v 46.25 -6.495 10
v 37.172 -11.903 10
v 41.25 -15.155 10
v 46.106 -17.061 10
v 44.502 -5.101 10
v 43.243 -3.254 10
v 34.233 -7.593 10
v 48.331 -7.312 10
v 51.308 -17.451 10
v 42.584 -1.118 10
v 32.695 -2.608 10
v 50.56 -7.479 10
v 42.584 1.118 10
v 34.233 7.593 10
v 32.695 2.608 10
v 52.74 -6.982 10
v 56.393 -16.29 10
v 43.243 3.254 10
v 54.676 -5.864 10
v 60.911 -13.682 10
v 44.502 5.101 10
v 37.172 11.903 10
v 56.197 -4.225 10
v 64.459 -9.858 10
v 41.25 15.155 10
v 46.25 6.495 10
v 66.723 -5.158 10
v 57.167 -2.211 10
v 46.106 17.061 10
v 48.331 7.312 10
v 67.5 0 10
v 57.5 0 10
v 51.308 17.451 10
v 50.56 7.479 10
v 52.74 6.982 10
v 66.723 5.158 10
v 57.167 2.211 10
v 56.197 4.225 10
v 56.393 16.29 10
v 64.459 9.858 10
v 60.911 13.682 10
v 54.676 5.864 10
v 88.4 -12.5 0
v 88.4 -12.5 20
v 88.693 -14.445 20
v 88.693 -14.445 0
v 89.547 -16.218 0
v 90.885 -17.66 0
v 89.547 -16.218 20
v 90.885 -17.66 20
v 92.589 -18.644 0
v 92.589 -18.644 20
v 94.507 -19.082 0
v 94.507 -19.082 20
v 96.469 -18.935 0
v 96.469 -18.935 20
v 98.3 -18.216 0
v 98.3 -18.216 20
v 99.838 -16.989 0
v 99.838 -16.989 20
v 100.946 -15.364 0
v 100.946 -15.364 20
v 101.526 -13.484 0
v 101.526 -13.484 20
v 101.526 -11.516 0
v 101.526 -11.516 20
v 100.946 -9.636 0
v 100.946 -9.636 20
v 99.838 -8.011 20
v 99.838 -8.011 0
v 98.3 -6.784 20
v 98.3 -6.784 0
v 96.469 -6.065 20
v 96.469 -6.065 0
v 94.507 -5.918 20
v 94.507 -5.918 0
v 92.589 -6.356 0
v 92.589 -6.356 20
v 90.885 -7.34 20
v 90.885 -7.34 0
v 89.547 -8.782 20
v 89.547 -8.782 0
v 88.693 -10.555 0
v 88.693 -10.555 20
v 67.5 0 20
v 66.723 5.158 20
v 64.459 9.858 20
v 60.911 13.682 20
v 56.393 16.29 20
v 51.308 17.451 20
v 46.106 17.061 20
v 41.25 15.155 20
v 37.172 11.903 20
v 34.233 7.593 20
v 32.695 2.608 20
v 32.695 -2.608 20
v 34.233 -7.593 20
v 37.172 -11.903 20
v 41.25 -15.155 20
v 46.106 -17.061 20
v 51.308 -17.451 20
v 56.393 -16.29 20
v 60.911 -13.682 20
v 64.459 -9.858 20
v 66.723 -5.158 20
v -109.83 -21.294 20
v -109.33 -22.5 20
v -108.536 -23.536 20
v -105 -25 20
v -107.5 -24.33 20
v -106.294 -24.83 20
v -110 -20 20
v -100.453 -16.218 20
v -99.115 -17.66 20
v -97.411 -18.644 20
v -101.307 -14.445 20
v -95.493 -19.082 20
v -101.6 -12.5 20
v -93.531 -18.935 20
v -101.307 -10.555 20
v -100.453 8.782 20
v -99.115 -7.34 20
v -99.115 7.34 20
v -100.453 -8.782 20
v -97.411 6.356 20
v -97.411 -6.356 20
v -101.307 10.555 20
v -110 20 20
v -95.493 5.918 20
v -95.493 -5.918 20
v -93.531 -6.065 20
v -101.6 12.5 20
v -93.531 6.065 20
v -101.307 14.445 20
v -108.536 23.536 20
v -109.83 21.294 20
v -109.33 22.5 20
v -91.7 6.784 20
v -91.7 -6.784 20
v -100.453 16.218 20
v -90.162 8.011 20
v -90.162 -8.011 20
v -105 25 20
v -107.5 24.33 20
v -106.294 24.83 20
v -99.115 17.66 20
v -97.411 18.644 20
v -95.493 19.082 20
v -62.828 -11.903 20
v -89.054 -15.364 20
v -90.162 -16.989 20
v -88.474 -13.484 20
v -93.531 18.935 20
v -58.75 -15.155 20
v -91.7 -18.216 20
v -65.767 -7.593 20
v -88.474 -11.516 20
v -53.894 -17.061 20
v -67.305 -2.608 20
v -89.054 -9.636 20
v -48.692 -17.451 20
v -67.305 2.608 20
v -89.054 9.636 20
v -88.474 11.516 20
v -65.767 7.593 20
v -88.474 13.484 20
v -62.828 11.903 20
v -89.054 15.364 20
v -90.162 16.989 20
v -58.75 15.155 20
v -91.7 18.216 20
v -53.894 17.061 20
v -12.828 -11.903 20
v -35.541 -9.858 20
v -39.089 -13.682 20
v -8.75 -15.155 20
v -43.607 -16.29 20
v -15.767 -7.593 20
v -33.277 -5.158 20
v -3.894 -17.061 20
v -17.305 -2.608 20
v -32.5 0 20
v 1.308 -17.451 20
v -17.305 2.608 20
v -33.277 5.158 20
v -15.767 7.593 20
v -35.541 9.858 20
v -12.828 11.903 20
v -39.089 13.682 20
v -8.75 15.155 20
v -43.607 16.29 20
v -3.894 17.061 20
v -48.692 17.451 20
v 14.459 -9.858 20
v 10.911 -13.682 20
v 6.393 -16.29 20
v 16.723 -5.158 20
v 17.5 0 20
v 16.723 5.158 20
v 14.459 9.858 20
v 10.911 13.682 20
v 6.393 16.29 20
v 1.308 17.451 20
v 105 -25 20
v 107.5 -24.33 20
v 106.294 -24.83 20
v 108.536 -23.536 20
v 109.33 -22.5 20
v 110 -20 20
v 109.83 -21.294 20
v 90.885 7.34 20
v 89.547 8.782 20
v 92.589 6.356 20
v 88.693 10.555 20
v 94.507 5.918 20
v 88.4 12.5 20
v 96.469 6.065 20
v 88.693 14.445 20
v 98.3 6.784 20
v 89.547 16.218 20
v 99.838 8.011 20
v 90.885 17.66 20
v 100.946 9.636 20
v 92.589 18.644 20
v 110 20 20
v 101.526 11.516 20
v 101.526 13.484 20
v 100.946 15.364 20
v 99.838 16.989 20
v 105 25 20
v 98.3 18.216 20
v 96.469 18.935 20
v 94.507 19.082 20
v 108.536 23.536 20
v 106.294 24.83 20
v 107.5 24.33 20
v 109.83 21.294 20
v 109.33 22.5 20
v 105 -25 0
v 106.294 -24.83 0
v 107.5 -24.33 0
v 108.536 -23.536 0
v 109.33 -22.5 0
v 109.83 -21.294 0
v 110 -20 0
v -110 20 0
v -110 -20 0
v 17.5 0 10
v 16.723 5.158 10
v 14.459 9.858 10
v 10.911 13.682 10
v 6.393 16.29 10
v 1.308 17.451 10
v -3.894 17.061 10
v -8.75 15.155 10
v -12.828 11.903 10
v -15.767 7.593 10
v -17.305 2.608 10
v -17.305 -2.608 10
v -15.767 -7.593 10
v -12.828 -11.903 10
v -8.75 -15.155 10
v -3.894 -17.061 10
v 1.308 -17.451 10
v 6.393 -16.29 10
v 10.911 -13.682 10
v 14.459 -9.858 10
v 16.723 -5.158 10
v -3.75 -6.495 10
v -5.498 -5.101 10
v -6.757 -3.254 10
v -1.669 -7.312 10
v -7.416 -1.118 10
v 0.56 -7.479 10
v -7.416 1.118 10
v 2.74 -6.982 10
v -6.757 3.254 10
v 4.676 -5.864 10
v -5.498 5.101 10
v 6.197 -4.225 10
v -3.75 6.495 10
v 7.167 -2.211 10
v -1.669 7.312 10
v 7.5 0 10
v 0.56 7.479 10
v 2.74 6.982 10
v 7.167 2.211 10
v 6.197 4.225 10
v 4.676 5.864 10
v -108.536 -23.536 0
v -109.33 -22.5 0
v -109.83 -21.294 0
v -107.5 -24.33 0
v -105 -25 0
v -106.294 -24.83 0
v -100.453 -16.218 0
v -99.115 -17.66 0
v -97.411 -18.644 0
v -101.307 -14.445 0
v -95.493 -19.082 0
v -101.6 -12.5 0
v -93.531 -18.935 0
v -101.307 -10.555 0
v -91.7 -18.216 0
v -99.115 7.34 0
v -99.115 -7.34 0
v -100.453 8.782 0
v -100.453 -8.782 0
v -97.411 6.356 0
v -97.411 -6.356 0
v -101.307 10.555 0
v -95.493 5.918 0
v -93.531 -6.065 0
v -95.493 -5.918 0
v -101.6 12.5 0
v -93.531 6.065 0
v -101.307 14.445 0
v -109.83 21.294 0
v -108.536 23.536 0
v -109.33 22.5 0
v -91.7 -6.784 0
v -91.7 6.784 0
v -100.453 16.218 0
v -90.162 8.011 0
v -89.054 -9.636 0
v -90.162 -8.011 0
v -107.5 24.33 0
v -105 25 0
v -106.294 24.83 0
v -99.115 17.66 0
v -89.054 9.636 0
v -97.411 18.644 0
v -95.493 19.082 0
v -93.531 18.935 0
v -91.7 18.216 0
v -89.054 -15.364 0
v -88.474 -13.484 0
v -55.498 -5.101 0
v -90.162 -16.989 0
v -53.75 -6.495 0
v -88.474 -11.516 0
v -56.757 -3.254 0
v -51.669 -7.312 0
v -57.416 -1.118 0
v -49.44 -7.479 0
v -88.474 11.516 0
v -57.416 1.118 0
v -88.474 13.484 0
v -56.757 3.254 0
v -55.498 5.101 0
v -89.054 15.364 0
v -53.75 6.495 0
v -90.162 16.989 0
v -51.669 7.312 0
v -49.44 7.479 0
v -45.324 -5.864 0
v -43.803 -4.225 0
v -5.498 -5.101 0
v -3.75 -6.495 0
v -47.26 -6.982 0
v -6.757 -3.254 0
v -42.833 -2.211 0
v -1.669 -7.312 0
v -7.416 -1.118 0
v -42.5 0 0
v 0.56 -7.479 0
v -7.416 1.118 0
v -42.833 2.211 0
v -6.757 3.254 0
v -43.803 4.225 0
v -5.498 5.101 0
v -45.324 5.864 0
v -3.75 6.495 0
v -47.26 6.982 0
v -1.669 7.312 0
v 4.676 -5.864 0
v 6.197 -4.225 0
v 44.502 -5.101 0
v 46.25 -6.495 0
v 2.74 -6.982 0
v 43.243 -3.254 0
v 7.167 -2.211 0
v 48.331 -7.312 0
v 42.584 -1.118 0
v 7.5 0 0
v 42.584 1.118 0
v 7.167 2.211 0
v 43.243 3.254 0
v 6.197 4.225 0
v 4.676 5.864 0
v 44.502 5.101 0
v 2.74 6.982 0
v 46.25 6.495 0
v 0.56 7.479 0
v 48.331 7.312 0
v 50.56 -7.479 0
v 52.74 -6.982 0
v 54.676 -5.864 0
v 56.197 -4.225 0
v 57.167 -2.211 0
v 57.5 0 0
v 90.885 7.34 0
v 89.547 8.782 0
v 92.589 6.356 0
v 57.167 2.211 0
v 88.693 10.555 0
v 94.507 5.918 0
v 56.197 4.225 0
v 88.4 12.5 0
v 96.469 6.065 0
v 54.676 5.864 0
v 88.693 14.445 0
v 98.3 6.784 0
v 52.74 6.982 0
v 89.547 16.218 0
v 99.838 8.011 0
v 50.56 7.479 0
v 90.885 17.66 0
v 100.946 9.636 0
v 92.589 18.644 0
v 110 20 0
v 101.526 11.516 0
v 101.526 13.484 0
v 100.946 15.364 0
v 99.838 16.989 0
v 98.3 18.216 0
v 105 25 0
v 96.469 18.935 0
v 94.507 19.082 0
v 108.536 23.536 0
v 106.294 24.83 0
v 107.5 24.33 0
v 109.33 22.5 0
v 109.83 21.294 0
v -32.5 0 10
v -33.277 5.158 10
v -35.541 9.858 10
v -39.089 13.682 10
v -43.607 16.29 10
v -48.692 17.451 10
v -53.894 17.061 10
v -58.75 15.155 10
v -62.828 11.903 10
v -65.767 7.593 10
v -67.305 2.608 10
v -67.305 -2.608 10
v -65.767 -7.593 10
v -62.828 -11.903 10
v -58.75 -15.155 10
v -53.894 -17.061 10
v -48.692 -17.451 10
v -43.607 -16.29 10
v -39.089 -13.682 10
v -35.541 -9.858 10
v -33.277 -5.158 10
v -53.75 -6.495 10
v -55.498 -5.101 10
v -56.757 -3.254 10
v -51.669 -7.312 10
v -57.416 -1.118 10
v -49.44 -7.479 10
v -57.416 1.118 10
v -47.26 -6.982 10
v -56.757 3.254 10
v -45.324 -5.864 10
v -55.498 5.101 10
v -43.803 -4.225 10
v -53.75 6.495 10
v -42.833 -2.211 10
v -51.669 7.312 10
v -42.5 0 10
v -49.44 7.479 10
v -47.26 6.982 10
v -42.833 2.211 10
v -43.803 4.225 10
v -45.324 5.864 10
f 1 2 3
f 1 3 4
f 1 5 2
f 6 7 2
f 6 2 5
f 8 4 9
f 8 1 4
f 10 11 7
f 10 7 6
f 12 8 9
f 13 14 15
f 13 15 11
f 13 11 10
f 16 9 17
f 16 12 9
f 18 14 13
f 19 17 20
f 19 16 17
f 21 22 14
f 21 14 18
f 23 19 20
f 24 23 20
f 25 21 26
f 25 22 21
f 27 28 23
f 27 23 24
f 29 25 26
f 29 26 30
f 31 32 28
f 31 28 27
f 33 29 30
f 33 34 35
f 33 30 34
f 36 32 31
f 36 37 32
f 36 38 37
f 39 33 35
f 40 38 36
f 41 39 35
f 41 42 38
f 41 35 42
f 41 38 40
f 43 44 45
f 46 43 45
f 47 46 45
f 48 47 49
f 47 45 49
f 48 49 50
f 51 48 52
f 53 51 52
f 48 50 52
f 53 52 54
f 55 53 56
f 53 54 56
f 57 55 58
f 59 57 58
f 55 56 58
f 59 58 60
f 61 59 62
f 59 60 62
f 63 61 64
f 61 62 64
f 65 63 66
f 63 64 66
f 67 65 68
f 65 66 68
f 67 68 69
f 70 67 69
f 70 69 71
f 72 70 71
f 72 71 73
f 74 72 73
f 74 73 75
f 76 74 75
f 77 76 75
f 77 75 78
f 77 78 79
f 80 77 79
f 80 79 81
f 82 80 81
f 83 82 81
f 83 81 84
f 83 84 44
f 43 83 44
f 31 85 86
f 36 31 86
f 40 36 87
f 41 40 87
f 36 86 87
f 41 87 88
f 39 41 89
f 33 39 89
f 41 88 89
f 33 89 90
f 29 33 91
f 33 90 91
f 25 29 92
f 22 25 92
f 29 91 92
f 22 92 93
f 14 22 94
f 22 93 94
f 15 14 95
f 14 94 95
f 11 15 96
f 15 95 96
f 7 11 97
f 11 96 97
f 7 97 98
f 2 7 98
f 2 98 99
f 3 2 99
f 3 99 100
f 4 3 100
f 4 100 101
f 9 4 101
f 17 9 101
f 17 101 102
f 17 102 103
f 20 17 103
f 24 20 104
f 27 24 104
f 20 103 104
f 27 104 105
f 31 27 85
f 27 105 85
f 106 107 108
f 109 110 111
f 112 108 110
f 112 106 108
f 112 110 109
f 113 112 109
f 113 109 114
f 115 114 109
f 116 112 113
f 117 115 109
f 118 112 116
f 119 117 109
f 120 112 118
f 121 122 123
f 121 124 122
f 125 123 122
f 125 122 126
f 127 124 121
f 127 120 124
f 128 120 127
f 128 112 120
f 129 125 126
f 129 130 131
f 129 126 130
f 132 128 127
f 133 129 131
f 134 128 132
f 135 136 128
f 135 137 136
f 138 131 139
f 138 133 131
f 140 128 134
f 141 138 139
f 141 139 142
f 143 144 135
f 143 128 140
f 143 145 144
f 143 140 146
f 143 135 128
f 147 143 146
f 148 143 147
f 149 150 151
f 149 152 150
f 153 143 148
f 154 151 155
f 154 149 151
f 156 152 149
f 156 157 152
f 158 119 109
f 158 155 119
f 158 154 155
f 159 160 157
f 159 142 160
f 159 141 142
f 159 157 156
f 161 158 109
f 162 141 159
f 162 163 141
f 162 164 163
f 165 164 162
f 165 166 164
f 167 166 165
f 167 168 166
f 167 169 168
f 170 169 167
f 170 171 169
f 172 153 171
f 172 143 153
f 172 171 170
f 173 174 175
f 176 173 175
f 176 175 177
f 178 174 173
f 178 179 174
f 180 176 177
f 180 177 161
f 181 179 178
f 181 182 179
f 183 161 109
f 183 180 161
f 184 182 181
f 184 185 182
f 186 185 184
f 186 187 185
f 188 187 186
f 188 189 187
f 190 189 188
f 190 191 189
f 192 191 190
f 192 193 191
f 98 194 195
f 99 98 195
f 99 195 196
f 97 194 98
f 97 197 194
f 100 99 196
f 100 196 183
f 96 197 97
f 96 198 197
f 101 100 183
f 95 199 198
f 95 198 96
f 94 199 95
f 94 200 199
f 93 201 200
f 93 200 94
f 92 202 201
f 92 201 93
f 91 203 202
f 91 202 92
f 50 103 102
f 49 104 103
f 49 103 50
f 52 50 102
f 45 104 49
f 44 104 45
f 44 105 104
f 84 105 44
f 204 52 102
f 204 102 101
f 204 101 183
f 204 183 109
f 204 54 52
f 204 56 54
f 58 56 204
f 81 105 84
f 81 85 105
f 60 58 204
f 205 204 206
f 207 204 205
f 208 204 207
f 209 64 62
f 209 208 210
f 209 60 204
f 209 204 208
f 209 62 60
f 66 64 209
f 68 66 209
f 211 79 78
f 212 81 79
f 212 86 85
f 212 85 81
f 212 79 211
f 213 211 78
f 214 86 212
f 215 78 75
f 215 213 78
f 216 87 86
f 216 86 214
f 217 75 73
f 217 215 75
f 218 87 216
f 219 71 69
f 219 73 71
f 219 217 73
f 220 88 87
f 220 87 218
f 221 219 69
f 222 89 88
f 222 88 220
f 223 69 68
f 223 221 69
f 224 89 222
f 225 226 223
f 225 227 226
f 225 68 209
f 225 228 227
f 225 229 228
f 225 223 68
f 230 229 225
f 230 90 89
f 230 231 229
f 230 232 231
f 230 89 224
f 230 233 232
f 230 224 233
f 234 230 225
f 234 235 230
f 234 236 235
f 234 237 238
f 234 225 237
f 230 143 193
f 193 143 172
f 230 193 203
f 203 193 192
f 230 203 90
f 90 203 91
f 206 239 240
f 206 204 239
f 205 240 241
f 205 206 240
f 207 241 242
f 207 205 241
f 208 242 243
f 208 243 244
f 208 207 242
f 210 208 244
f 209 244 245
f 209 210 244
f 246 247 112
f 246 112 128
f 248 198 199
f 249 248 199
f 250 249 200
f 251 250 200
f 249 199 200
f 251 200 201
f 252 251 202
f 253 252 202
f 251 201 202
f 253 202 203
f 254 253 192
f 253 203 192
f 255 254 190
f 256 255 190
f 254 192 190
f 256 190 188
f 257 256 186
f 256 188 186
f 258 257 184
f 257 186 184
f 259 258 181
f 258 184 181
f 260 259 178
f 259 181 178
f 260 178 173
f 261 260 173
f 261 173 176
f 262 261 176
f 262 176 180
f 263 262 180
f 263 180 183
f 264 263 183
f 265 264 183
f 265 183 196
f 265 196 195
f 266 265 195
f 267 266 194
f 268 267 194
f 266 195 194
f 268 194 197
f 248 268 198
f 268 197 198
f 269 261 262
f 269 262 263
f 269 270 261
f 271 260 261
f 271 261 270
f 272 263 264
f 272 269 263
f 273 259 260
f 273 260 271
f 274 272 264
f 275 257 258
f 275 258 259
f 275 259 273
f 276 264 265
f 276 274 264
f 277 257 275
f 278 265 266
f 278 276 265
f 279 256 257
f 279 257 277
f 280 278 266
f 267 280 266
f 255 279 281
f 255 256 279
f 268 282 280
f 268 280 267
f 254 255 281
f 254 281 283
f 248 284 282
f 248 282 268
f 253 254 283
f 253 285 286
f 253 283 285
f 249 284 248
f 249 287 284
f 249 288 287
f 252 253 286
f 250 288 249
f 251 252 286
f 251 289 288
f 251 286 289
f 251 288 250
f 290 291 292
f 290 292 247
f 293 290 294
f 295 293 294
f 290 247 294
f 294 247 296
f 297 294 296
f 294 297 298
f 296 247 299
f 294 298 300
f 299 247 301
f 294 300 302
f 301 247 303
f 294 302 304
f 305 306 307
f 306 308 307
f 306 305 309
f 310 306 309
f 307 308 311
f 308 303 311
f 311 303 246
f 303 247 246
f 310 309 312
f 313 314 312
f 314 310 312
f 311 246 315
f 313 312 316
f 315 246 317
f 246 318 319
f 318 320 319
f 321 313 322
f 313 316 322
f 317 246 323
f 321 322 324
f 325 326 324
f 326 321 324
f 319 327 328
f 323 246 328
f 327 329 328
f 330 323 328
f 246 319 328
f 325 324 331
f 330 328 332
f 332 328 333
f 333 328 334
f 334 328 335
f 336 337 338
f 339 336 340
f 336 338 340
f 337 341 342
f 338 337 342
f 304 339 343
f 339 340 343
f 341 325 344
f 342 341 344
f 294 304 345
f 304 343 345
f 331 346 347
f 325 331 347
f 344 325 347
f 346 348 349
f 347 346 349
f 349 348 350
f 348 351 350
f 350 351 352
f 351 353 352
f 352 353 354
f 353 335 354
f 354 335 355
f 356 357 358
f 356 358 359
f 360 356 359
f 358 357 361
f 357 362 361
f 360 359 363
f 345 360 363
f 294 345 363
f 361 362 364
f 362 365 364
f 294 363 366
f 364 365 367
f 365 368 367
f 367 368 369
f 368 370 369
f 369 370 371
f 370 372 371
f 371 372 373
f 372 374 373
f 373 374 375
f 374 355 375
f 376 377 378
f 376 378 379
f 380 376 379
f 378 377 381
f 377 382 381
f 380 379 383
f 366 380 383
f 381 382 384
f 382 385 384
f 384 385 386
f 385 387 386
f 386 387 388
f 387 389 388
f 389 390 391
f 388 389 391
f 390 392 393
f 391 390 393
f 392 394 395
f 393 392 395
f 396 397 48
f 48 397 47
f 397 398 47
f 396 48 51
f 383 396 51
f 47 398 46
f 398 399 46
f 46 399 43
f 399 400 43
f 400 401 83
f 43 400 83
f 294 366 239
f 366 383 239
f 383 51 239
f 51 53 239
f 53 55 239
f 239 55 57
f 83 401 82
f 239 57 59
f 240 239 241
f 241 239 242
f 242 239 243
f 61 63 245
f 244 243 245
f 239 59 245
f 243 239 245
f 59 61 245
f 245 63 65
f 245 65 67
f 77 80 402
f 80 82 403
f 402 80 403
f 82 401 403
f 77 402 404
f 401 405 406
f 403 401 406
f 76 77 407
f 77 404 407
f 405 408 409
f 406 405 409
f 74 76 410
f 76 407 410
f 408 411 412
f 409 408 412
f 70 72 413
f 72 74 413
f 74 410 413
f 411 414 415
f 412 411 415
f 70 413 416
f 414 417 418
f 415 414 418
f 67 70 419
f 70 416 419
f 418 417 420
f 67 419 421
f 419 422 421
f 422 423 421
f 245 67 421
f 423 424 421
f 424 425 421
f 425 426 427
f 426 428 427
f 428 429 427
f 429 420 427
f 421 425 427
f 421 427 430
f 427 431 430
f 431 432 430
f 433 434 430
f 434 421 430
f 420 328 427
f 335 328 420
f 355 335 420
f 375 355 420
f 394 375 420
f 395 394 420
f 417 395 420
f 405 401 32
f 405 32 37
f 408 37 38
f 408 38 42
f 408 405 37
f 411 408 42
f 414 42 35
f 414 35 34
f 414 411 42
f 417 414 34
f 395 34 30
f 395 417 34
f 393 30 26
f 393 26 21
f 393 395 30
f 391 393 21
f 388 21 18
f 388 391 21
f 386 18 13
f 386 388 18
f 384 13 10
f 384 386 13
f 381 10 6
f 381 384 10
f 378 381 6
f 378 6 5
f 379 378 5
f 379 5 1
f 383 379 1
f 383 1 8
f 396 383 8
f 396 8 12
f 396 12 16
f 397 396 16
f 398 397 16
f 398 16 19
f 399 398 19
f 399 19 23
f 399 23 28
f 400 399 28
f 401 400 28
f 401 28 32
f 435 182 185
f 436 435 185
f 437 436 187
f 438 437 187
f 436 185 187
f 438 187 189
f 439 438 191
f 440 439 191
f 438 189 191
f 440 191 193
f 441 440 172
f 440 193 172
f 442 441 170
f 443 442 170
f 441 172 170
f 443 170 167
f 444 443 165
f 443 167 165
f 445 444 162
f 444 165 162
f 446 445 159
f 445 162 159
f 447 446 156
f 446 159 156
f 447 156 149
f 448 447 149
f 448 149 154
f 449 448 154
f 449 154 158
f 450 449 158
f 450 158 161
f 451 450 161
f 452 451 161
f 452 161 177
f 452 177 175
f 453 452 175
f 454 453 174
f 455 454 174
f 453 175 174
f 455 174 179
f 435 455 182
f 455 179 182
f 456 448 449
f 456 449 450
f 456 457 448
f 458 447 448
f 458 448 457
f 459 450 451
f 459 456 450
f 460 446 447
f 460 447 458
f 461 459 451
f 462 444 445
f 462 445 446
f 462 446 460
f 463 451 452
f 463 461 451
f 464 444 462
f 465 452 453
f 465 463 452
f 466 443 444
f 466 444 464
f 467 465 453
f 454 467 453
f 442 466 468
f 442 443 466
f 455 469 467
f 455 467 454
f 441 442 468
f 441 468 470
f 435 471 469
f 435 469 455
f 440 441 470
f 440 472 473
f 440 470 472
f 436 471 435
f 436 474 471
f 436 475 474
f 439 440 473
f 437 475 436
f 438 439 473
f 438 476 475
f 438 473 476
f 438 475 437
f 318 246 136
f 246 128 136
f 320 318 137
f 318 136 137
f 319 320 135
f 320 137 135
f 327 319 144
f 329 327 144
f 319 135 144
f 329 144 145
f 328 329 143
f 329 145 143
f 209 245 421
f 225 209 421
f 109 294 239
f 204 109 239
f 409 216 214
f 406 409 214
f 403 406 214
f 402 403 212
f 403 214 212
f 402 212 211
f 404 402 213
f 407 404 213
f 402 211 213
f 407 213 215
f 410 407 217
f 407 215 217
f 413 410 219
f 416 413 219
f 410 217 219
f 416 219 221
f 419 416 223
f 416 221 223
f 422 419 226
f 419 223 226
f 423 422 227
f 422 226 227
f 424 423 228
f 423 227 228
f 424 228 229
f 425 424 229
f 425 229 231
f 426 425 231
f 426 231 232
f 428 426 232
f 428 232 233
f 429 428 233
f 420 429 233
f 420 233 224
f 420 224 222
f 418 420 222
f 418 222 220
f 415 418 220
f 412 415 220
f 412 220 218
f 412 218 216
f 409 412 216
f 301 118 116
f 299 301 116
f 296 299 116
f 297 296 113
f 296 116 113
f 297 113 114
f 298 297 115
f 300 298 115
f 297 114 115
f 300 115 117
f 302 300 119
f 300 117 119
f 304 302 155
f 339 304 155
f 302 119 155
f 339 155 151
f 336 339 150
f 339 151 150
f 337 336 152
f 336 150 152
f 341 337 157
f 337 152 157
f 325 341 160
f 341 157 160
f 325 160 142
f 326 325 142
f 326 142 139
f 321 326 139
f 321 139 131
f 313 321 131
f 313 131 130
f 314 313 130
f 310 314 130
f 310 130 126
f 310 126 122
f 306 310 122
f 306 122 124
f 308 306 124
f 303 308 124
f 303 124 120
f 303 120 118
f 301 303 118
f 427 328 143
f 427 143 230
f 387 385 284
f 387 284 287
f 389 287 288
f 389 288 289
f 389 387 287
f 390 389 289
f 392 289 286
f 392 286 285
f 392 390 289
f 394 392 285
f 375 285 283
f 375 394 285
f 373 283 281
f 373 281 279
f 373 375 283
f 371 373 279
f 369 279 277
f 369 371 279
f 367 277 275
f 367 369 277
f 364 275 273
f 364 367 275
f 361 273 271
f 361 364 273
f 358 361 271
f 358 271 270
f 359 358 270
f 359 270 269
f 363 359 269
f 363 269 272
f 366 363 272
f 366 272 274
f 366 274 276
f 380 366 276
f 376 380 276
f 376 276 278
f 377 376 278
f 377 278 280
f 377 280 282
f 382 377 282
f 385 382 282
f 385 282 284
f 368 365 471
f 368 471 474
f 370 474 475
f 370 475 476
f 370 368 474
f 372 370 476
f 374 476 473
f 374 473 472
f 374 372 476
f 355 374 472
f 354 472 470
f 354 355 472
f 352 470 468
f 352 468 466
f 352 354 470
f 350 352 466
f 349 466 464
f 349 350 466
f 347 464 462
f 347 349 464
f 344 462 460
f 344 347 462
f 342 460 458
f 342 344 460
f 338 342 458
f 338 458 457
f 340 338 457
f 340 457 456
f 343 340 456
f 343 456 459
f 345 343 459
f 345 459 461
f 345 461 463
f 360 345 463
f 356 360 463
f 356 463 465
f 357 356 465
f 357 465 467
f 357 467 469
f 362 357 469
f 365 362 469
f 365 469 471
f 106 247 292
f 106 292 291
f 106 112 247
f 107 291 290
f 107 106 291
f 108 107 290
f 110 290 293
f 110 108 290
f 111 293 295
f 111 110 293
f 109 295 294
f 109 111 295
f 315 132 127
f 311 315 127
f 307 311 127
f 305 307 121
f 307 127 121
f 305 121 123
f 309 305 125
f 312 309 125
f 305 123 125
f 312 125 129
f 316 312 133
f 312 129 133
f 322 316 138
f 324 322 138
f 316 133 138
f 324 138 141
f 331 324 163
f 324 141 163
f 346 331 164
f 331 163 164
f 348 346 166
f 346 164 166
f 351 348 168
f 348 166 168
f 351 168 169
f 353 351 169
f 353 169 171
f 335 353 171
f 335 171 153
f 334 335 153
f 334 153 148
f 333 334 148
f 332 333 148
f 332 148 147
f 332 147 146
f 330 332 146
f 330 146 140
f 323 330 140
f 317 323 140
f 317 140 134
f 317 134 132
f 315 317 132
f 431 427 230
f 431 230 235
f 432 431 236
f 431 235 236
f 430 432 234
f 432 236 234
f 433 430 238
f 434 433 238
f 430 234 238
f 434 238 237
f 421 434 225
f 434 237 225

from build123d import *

# Parameters (mm, degrees)
F0_W     = 220
F0_H     = 50
F0_R     = 7.5
F1_DEPTH = 20
F2_D     = 13.2
F3_R     = 5
F4_R     = 17.5
F4_R_2   = 7.5
F5_DEPTH = 10


with BuildPart() as f1:
    # F0 (on Top) → F1 (new body)
    with BuildSketch(Plane.XY):
        Rectangle(F0_W, F0_H)
        with Locations((-50, 0)):
            Circle(F0_R, mode=Mode.SUBTRACT)
        Circle(F0_R, mode=Mode.SUBTRACT)
        with Locations((50, 0)):
            Circle(F0_R, mode=Mode.SUBTRACT)
    extrude(amount=F1_DEPTH)

    # F2 (through all)
    with Locations(Plane(origin=(0, 0, 0), x_dir=(1, 0, 0), z_dir=(0, 0, -1))):
        with Locations((-95, -12.5), (-95, 12.5), (95, -12.5), (95, 12.5)):
            Hole(F2_D / 2)

    # F3
    f3_edges = [f1.edges().sort_by_distance(p)[0] for p in [
        (-110, -25, 10),
        (110, -25, 10),
        (110, 25, 10),
        (-110, 25, 10),
    ]]
    fillet(f3_edges, radius=F3_R)

    # F4 (on face) → F5 (cut)
    with BuildSketch(Plane.XY.offset(20)):
        with Locations((-50, 0)):
            Circle(F4_R)
        with Locations((-50, 0)):
            Circle(F4_R_2, mode=Mode.SUBTRACT)
        with Locations((50, 0)):
            Circle(F4_R)
        with Locations((50, 0)):
            Circle(F4_R_2, mode=Mode.SUBTRACT)
        Circle(F4_R)
        Circle(F4_R_2, mode=Mode.SUBTRACT)
    extrude(amount=-F5_DEPTH, mode=Mode.SUBTRACT)


solid = f1.part
